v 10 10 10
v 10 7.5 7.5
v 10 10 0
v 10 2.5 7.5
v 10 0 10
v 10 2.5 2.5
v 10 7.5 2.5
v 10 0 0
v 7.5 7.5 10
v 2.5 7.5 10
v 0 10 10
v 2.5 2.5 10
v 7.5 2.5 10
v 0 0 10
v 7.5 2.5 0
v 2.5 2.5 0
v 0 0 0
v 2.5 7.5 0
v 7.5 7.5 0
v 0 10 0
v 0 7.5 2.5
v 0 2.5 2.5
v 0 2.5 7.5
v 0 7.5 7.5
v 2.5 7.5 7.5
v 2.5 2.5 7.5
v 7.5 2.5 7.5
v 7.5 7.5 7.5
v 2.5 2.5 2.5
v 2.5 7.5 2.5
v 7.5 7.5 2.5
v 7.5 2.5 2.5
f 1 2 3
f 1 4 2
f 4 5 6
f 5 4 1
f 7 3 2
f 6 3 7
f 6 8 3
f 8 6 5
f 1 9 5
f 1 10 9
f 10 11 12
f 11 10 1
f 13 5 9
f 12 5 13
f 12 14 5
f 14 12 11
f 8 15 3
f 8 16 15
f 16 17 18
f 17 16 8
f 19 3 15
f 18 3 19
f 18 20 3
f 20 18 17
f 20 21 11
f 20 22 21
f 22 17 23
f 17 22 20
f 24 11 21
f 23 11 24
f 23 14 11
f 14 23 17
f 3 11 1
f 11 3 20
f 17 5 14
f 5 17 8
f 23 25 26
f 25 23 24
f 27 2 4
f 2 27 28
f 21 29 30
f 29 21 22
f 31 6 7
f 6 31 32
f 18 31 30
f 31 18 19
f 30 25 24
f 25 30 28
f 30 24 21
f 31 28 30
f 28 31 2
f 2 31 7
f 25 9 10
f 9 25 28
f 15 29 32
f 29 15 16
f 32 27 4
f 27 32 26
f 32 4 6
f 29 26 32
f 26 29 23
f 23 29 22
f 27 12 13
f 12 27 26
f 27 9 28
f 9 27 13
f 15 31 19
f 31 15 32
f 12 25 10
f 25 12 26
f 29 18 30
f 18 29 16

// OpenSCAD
difference() {
	cube(10);
	translate([-1, 2.5, 2.5])
		cube([12, 5, 5]);
	translate([2.5, 2.5, -1])
		cube([5, 5, 12]);
}
